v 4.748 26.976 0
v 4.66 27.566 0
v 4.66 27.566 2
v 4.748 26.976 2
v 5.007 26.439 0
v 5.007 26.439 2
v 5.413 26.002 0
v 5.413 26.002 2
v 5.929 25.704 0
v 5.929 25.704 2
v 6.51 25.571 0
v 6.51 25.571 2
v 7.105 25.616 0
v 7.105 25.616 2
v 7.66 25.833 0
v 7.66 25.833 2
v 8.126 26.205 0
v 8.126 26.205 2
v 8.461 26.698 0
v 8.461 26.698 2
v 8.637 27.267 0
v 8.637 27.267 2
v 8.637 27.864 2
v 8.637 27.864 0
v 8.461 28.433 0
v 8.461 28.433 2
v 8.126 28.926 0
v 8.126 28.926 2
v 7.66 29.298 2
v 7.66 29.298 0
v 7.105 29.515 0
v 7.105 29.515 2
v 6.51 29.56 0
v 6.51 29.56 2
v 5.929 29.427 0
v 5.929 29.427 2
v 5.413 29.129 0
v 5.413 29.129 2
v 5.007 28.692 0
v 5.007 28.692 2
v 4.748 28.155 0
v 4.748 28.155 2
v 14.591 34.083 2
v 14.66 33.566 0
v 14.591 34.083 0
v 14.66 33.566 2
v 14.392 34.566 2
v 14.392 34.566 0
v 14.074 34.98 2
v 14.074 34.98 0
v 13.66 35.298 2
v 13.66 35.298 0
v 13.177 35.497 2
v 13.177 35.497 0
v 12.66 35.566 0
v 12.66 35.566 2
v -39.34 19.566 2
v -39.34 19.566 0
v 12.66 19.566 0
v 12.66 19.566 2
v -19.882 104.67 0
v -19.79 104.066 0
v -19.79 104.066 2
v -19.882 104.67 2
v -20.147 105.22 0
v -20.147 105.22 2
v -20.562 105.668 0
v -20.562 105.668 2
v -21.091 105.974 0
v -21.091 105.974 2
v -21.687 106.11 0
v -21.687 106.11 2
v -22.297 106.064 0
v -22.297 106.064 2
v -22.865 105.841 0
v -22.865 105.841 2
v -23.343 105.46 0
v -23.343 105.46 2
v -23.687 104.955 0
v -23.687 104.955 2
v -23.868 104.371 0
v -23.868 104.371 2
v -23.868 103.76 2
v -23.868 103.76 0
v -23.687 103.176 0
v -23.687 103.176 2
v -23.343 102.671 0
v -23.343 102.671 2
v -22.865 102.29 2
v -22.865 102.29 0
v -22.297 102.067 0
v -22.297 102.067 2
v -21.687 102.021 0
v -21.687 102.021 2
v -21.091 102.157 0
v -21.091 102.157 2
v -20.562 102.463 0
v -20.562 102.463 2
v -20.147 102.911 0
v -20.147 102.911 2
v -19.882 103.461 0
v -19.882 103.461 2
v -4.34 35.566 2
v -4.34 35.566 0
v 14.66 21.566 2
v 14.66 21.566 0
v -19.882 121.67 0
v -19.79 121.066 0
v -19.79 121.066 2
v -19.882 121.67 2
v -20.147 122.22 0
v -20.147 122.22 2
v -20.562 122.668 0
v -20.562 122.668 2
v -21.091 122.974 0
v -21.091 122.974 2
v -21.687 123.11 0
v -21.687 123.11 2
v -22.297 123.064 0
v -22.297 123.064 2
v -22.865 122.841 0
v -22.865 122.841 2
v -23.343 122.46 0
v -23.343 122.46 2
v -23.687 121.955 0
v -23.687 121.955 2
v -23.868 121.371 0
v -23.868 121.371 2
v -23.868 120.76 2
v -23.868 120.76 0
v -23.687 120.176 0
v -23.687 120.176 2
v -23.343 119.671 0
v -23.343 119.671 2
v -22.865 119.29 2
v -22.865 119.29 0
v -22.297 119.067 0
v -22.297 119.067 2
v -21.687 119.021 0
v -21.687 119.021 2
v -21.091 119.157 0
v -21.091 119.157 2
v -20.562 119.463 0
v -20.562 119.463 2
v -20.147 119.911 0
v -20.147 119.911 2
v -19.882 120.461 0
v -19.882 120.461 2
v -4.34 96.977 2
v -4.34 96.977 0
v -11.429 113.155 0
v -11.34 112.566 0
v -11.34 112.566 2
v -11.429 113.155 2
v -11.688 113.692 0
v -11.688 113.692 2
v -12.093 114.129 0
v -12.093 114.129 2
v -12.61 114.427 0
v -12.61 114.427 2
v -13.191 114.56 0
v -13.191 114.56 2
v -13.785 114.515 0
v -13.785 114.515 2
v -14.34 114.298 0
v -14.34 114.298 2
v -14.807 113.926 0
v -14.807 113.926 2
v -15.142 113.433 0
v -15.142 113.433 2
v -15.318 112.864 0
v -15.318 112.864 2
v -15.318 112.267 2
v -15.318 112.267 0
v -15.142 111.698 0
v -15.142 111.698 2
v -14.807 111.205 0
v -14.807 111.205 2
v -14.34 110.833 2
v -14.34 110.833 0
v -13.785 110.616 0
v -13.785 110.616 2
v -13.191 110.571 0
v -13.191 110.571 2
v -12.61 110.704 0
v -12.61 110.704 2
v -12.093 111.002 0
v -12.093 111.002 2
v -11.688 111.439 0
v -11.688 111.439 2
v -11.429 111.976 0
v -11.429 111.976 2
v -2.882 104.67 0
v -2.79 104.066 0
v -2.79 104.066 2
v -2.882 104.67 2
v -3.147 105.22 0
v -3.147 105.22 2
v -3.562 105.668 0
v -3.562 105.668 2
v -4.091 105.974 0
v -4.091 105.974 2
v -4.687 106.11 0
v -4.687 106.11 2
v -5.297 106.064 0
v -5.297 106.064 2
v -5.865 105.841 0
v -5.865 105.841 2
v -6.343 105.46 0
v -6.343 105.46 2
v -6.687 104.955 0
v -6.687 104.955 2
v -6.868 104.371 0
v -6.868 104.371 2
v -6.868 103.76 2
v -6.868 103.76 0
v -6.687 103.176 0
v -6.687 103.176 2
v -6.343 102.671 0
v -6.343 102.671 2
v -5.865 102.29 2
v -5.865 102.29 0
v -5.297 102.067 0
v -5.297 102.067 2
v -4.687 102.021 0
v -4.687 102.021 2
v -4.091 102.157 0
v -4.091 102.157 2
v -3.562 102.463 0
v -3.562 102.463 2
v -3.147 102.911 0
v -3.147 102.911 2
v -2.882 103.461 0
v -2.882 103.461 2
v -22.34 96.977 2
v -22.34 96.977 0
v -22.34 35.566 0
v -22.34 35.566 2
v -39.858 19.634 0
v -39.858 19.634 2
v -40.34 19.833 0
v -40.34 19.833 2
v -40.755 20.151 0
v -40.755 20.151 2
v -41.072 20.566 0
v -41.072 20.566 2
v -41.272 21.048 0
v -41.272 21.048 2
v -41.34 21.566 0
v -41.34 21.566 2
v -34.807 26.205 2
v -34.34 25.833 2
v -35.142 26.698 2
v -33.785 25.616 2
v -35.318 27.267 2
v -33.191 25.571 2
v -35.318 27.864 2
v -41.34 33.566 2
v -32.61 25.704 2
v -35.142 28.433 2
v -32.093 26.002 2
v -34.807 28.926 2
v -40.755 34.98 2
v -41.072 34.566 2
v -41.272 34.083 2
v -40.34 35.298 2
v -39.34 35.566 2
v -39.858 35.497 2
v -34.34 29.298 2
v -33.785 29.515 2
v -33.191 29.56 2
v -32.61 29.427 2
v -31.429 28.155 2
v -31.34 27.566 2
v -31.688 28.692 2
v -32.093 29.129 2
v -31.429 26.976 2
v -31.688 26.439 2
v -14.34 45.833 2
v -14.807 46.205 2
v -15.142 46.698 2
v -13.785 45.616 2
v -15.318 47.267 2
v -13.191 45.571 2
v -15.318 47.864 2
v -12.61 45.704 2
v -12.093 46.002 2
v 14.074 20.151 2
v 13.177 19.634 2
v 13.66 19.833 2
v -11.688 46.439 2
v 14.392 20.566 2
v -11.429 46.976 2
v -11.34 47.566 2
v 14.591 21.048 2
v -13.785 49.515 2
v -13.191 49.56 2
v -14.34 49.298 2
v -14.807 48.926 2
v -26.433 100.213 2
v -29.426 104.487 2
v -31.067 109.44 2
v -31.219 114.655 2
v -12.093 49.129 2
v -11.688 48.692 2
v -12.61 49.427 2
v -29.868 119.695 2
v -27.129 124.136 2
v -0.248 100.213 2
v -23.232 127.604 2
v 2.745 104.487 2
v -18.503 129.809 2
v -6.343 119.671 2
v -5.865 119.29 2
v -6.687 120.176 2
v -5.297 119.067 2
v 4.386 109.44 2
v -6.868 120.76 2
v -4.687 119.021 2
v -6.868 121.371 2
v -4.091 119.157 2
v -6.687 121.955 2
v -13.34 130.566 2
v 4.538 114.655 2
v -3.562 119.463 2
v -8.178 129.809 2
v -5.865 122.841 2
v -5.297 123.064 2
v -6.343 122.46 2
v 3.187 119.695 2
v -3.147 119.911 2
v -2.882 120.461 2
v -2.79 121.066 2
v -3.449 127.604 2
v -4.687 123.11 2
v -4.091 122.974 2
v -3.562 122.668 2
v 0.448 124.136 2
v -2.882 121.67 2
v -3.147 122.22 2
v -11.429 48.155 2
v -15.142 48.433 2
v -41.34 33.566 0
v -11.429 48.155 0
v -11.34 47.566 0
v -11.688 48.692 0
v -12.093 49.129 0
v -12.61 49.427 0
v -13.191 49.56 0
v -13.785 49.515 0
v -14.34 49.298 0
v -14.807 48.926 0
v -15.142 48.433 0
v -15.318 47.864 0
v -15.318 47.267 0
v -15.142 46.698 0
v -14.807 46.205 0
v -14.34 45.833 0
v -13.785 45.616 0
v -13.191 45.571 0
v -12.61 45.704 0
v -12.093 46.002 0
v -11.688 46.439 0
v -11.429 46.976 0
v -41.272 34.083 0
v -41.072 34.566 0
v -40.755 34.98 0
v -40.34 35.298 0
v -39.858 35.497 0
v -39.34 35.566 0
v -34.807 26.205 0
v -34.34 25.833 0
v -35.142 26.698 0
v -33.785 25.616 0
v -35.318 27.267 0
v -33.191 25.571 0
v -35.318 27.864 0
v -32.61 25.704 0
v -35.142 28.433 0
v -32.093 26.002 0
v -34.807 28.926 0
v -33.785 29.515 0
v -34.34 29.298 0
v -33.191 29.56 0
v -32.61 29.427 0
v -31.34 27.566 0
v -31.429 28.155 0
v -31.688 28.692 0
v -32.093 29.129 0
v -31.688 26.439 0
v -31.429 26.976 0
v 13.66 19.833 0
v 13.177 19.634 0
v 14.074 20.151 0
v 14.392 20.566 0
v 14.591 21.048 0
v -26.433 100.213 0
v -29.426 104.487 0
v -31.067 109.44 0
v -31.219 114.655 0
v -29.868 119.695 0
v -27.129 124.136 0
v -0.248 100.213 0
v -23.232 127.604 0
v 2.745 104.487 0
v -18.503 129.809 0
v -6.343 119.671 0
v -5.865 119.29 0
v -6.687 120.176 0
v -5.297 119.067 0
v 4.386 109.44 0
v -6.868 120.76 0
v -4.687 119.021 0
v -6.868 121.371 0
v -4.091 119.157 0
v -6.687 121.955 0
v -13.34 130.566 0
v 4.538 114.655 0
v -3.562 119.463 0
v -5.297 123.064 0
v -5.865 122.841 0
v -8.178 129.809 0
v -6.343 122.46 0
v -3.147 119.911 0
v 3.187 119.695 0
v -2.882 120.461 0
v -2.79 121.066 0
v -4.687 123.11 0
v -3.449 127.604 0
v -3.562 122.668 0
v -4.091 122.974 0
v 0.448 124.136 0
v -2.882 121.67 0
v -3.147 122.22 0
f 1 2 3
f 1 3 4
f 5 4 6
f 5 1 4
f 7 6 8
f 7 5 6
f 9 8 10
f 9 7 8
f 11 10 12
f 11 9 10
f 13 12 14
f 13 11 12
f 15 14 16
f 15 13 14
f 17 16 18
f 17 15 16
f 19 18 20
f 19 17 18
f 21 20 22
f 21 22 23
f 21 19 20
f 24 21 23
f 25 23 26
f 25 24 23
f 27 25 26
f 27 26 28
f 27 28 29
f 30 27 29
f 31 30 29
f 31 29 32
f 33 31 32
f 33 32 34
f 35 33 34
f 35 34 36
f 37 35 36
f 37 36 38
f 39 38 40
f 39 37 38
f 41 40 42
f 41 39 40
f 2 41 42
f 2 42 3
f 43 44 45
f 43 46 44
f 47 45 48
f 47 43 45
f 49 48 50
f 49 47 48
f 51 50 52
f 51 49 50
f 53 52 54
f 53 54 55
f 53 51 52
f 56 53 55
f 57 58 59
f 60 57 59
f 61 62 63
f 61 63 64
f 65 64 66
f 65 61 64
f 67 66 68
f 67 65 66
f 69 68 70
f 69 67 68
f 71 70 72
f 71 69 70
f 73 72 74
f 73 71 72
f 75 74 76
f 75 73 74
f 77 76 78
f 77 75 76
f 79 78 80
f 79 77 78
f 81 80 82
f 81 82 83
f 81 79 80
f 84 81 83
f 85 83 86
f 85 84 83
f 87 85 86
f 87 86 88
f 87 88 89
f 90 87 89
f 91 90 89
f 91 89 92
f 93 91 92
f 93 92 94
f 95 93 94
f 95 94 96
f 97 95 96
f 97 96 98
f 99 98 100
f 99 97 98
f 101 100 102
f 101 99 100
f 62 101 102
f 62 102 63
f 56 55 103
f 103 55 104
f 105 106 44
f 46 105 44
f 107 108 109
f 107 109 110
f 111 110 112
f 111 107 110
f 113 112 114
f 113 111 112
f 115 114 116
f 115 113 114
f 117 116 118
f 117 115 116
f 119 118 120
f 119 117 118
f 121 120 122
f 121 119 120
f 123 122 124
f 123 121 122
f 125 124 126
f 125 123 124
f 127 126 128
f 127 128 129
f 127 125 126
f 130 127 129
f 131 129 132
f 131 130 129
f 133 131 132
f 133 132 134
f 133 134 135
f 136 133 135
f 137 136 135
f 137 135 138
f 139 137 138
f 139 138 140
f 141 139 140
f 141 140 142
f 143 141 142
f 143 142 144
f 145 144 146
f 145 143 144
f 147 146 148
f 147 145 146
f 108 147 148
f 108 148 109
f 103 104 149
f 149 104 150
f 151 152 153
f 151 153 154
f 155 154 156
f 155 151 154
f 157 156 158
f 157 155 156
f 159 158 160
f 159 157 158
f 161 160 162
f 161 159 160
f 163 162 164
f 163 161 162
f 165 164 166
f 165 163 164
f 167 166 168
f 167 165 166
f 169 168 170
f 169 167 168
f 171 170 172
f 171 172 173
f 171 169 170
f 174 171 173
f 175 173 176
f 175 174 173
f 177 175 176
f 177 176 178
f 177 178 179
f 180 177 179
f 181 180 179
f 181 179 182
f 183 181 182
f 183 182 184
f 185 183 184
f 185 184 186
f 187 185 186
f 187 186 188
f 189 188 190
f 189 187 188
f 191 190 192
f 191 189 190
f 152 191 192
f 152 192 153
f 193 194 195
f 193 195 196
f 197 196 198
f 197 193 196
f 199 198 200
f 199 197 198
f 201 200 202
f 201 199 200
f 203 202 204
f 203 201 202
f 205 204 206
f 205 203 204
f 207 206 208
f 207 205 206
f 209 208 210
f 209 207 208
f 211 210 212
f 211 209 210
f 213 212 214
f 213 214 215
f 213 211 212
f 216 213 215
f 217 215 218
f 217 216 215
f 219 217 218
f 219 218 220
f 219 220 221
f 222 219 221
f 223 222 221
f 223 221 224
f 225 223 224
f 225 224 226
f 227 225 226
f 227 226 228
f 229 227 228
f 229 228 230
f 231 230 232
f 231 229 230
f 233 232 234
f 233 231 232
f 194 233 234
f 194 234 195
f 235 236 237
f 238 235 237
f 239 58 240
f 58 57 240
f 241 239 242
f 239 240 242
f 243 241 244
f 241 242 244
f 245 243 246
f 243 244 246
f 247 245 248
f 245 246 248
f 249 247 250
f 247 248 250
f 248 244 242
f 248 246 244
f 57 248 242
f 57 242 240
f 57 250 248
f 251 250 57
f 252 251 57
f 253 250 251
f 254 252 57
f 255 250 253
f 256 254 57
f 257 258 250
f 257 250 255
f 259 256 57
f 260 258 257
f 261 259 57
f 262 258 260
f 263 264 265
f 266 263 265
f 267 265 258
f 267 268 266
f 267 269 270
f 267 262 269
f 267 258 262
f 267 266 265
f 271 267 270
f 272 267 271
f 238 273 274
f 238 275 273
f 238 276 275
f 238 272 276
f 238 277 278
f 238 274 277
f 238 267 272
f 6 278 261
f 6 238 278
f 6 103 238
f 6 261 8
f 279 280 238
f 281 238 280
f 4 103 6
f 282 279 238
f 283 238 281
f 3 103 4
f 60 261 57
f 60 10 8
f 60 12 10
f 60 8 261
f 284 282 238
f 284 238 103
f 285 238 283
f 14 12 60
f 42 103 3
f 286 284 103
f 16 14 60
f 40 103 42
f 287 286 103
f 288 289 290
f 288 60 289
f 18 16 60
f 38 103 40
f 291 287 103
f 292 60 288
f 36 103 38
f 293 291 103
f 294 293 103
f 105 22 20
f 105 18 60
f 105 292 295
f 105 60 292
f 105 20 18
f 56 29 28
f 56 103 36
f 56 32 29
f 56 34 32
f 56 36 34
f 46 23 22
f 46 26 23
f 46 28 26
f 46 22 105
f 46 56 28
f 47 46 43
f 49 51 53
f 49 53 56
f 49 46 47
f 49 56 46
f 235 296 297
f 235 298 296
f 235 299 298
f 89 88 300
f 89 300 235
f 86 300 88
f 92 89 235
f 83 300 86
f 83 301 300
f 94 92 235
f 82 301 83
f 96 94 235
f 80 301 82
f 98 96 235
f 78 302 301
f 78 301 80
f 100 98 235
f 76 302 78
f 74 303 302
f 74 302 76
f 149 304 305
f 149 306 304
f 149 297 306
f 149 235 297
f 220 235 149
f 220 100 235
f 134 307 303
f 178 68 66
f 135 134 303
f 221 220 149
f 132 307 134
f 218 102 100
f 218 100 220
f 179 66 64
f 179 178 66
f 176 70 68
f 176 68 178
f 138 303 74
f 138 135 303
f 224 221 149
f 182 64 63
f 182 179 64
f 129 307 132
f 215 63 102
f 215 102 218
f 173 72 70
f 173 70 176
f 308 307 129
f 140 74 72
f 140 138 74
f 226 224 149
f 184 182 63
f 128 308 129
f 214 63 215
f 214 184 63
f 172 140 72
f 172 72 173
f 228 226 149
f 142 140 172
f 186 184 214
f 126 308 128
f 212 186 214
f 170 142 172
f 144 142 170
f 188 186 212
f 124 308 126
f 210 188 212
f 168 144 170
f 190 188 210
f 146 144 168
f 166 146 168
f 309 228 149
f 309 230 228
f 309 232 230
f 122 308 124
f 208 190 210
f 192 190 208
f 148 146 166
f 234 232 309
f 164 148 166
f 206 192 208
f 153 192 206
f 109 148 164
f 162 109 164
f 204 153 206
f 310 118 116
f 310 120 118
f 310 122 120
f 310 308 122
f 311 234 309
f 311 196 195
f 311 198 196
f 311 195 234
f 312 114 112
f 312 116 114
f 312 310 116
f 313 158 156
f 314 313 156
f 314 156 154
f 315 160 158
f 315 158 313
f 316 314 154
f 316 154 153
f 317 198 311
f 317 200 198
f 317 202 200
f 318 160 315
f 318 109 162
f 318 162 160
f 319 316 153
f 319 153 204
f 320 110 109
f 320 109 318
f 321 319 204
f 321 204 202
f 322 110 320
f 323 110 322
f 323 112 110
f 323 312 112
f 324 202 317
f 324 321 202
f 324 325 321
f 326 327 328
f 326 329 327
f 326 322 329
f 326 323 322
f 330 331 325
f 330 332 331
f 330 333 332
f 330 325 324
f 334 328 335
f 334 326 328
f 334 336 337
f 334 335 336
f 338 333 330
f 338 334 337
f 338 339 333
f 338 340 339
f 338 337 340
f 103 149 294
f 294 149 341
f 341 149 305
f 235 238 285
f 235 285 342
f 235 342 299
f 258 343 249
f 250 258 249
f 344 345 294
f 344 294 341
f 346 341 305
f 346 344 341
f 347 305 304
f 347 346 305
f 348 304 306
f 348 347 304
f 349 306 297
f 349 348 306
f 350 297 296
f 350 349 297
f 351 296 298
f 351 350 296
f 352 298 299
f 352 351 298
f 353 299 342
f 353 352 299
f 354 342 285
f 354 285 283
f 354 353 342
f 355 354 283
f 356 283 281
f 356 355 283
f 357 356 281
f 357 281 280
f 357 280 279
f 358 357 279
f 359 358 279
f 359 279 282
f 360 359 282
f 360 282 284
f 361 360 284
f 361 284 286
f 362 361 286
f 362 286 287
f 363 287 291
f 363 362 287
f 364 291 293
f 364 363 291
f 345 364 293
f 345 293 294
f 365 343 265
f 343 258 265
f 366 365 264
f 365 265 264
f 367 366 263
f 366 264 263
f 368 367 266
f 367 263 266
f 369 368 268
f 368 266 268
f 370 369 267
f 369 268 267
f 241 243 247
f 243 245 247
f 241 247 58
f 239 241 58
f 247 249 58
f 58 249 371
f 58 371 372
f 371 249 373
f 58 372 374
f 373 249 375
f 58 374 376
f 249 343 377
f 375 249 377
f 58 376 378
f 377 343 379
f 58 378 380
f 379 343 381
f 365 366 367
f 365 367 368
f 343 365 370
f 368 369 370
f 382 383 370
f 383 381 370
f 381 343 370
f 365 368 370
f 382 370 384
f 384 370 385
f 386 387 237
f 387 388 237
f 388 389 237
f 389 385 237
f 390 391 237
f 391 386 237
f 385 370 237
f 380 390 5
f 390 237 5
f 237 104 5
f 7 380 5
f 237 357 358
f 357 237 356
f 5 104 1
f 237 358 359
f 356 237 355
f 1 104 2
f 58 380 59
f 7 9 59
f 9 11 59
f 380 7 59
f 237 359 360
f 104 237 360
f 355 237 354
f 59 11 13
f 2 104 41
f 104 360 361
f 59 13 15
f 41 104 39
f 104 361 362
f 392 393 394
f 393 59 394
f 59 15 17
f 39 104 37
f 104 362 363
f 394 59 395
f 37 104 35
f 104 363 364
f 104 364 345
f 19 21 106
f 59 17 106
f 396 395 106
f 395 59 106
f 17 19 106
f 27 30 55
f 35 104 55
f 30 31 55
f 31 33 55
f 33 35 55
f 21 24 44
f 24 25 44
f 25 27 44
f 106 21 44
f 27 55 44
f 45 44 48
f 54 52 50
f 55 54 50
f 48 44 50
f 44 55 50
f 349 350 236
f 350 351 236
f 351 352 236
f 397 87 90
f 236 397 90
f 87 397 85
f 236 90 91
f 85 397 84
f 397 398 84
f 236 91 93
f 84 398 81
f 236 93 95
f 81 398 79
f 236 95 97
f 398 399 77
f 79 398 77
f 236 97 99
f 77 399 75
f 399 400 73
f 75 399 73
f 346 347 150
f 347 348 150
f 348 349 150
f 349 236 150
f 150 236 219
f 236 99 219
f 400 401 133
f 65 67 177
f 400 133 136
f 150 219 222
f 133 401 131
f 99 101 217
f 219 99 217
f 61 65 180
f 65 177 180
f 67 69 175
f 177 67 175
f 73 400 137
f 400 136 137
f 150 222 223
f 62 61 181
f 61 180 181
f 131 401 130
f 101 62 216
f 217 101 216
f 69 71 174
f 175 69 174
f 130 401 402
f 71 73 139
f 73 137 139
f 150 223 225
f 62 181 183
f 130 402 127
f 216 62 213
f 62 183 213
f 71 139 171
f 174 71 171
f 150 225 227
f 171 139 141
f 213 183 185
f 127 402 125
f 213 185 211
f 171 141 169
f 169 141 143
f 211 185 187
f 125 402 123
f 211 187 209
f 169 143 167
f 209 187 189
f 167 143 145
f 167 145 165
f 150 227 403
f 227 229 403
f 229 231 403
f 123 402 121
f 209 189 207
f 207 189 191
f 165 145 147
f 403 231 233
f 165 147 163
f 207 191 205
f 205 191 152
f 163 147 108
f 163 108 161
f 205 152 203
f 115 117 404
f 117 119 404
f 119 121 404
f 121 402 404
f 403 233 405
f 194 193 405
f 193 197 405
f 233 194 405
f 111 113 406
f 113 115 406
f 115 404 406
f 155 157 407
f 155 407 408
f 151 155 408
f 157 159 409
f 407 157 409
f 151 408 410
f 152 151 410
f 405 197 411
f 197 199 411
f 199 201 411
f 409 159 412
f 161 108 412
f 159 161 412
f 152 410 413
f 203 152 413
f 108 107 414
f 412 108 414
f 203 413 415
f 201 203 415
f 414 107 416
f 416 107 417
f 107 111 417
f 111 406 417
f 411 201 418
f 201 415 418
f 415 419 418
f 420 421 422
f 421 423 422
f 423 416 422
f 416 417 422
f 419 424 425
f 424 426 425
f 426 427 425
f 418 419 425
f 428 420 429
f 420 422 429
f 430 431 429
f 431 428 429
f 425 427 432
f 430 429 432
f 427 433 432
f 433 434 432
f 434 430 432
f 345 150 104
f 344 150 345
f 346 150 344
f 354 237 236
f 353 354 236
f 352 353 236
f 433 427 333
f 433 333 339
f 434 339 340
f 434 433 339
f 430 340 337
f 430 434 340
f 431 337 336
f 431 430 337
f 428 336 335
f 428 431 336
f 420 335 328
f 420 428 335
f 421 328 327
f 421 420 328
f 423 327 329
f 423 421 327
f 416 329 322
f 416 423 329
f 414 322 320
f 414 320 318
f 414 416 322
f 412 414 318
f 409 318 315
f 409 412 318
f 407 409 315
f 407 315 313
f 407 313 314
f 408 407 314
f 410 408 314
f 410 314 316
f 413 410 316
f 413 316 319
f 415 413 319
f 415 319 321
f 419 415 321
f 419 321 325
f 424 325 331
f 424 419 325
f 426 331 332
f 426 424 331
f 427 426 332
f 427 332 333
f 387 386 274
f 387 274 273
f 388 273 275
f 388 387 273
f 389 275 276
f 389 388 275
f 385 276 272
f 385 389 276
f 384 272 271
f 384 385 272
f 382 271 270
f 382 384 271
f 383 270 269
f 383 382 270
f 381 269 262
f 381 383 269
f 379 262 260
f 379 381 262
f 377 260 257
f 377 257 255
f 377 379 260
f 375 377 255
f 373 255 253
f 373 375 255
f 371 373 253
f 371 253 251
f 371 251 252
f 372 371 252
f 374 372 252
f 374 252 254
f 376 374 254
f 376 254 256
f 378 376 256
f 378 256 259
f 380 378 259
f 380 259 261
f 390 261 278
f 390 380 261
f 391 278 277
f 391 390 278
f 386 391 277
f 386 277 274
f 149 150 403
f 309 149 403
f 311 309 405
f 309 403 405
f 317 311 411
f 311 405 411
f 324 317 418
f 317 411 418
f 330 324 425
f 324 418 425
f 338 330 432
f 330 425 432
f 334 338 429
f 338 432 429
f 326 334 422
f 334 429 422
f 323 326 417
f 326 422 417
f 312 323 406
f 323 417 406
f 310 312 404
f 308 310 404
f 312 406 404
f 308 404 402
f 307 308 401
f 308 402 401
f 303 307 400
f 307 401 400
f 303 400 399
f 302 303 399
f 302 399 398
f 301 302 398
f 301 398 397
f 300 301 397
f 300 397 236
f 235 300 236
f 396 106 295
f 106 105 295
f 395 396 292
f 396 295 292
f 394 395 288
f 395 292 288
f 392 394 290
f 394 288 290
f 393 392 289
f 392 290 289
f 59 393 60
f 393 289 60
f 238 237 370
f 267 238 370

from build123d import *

# Parameters (mm, degrees)
SKETCH_1_R      = 2
SKETCH_1_R_2    = 2.05
EXTRUDE_1_DEPTH = 2
FILLET_1_R      = 2


with BuildPart() as part:
    # 草图1 → 凸台-拉伸1 (new body)
    with BuildSketch(Plane.XY):
        with BuildLine():
            Line((14.659550972, 19.565520938), (14.659550972, 35.565520938))
            Line((14.659550972, 35.565520938), (-4.340449028, 35.565520938))
            Line((-4.340449028, 35.565520938), (-4.340449028, 96.97706367))
            ThreePointArc((-4.340449028, 96.97706367), (-13.340449028, 130.565520938), (-22.340449028, 96.97706367))
            Line((-22.340449028, 96.97706367), (-22.340449028, 35.565520938))
            Line((-22.340449028, 35.565520938), (-41.340449028, 35.565520938))
            Line((-41.340449028, 35.565520938), (-41.340449028, 19.565520938))
            Line((-41.340449028, 19.565520938), (14.659550972, 19.565520938))
        make_face()
        with Locations((-33.340449028, 27.565520938)):
            Circle(SKETCH_1_R, mode=Mode.SUBTRACT)
        with Locations(Location((6.659550972, 27.565520938, 0), (0, 0, 180))):
            Circle(SKETCH_1_R, mode=Mode.SUBTRACT)
        with Locations((-13.340449028, 112.565520938)):
            Circle(SKETCH_1_R, mode=Mode.SUBTRACT)
        with Locations((-13.340449028, 47.565520938)):
            Circle(SKETCH_1_R, mode=Mode.SUBTRACT)
        with Locations((-4.840449028, 121.065520938)):
            Circle(SKETCH_1_R_2, mode=Mode.SUBTRACT)
        with Locations((-4.840449028, 104.065520938)):
            Circle(SKETCH_1_R_2, mode=Mode.SUBTRACT)
        with Locations((-21.840449028, 104.065520938)):
            Circle(SKETCH_1_R_2, mode=Mode.SUBTRACT)
        with Locations((-21.840449028, 121.065520938)):
            Circle(SKETCH_1_R_2, mode=Mode.SUBTRACT)
    extrude(amount=EXTRUDE_1_DEPTH)

    # 圆角1
    fillet_1_edges = [part.edges().sort_by_distance(p)[0] for p in [
        (-41.340449028, 19.565520938, 1),
        (-41.340449028, 35.565520938, 1),
        (14.659550972, 35.565520938, 1),
        (14.659550972, 19.565520938, 1),
    ]]
    fillet(fillet_1_edges, radius=FILLET_1_R)


solid = part.part
